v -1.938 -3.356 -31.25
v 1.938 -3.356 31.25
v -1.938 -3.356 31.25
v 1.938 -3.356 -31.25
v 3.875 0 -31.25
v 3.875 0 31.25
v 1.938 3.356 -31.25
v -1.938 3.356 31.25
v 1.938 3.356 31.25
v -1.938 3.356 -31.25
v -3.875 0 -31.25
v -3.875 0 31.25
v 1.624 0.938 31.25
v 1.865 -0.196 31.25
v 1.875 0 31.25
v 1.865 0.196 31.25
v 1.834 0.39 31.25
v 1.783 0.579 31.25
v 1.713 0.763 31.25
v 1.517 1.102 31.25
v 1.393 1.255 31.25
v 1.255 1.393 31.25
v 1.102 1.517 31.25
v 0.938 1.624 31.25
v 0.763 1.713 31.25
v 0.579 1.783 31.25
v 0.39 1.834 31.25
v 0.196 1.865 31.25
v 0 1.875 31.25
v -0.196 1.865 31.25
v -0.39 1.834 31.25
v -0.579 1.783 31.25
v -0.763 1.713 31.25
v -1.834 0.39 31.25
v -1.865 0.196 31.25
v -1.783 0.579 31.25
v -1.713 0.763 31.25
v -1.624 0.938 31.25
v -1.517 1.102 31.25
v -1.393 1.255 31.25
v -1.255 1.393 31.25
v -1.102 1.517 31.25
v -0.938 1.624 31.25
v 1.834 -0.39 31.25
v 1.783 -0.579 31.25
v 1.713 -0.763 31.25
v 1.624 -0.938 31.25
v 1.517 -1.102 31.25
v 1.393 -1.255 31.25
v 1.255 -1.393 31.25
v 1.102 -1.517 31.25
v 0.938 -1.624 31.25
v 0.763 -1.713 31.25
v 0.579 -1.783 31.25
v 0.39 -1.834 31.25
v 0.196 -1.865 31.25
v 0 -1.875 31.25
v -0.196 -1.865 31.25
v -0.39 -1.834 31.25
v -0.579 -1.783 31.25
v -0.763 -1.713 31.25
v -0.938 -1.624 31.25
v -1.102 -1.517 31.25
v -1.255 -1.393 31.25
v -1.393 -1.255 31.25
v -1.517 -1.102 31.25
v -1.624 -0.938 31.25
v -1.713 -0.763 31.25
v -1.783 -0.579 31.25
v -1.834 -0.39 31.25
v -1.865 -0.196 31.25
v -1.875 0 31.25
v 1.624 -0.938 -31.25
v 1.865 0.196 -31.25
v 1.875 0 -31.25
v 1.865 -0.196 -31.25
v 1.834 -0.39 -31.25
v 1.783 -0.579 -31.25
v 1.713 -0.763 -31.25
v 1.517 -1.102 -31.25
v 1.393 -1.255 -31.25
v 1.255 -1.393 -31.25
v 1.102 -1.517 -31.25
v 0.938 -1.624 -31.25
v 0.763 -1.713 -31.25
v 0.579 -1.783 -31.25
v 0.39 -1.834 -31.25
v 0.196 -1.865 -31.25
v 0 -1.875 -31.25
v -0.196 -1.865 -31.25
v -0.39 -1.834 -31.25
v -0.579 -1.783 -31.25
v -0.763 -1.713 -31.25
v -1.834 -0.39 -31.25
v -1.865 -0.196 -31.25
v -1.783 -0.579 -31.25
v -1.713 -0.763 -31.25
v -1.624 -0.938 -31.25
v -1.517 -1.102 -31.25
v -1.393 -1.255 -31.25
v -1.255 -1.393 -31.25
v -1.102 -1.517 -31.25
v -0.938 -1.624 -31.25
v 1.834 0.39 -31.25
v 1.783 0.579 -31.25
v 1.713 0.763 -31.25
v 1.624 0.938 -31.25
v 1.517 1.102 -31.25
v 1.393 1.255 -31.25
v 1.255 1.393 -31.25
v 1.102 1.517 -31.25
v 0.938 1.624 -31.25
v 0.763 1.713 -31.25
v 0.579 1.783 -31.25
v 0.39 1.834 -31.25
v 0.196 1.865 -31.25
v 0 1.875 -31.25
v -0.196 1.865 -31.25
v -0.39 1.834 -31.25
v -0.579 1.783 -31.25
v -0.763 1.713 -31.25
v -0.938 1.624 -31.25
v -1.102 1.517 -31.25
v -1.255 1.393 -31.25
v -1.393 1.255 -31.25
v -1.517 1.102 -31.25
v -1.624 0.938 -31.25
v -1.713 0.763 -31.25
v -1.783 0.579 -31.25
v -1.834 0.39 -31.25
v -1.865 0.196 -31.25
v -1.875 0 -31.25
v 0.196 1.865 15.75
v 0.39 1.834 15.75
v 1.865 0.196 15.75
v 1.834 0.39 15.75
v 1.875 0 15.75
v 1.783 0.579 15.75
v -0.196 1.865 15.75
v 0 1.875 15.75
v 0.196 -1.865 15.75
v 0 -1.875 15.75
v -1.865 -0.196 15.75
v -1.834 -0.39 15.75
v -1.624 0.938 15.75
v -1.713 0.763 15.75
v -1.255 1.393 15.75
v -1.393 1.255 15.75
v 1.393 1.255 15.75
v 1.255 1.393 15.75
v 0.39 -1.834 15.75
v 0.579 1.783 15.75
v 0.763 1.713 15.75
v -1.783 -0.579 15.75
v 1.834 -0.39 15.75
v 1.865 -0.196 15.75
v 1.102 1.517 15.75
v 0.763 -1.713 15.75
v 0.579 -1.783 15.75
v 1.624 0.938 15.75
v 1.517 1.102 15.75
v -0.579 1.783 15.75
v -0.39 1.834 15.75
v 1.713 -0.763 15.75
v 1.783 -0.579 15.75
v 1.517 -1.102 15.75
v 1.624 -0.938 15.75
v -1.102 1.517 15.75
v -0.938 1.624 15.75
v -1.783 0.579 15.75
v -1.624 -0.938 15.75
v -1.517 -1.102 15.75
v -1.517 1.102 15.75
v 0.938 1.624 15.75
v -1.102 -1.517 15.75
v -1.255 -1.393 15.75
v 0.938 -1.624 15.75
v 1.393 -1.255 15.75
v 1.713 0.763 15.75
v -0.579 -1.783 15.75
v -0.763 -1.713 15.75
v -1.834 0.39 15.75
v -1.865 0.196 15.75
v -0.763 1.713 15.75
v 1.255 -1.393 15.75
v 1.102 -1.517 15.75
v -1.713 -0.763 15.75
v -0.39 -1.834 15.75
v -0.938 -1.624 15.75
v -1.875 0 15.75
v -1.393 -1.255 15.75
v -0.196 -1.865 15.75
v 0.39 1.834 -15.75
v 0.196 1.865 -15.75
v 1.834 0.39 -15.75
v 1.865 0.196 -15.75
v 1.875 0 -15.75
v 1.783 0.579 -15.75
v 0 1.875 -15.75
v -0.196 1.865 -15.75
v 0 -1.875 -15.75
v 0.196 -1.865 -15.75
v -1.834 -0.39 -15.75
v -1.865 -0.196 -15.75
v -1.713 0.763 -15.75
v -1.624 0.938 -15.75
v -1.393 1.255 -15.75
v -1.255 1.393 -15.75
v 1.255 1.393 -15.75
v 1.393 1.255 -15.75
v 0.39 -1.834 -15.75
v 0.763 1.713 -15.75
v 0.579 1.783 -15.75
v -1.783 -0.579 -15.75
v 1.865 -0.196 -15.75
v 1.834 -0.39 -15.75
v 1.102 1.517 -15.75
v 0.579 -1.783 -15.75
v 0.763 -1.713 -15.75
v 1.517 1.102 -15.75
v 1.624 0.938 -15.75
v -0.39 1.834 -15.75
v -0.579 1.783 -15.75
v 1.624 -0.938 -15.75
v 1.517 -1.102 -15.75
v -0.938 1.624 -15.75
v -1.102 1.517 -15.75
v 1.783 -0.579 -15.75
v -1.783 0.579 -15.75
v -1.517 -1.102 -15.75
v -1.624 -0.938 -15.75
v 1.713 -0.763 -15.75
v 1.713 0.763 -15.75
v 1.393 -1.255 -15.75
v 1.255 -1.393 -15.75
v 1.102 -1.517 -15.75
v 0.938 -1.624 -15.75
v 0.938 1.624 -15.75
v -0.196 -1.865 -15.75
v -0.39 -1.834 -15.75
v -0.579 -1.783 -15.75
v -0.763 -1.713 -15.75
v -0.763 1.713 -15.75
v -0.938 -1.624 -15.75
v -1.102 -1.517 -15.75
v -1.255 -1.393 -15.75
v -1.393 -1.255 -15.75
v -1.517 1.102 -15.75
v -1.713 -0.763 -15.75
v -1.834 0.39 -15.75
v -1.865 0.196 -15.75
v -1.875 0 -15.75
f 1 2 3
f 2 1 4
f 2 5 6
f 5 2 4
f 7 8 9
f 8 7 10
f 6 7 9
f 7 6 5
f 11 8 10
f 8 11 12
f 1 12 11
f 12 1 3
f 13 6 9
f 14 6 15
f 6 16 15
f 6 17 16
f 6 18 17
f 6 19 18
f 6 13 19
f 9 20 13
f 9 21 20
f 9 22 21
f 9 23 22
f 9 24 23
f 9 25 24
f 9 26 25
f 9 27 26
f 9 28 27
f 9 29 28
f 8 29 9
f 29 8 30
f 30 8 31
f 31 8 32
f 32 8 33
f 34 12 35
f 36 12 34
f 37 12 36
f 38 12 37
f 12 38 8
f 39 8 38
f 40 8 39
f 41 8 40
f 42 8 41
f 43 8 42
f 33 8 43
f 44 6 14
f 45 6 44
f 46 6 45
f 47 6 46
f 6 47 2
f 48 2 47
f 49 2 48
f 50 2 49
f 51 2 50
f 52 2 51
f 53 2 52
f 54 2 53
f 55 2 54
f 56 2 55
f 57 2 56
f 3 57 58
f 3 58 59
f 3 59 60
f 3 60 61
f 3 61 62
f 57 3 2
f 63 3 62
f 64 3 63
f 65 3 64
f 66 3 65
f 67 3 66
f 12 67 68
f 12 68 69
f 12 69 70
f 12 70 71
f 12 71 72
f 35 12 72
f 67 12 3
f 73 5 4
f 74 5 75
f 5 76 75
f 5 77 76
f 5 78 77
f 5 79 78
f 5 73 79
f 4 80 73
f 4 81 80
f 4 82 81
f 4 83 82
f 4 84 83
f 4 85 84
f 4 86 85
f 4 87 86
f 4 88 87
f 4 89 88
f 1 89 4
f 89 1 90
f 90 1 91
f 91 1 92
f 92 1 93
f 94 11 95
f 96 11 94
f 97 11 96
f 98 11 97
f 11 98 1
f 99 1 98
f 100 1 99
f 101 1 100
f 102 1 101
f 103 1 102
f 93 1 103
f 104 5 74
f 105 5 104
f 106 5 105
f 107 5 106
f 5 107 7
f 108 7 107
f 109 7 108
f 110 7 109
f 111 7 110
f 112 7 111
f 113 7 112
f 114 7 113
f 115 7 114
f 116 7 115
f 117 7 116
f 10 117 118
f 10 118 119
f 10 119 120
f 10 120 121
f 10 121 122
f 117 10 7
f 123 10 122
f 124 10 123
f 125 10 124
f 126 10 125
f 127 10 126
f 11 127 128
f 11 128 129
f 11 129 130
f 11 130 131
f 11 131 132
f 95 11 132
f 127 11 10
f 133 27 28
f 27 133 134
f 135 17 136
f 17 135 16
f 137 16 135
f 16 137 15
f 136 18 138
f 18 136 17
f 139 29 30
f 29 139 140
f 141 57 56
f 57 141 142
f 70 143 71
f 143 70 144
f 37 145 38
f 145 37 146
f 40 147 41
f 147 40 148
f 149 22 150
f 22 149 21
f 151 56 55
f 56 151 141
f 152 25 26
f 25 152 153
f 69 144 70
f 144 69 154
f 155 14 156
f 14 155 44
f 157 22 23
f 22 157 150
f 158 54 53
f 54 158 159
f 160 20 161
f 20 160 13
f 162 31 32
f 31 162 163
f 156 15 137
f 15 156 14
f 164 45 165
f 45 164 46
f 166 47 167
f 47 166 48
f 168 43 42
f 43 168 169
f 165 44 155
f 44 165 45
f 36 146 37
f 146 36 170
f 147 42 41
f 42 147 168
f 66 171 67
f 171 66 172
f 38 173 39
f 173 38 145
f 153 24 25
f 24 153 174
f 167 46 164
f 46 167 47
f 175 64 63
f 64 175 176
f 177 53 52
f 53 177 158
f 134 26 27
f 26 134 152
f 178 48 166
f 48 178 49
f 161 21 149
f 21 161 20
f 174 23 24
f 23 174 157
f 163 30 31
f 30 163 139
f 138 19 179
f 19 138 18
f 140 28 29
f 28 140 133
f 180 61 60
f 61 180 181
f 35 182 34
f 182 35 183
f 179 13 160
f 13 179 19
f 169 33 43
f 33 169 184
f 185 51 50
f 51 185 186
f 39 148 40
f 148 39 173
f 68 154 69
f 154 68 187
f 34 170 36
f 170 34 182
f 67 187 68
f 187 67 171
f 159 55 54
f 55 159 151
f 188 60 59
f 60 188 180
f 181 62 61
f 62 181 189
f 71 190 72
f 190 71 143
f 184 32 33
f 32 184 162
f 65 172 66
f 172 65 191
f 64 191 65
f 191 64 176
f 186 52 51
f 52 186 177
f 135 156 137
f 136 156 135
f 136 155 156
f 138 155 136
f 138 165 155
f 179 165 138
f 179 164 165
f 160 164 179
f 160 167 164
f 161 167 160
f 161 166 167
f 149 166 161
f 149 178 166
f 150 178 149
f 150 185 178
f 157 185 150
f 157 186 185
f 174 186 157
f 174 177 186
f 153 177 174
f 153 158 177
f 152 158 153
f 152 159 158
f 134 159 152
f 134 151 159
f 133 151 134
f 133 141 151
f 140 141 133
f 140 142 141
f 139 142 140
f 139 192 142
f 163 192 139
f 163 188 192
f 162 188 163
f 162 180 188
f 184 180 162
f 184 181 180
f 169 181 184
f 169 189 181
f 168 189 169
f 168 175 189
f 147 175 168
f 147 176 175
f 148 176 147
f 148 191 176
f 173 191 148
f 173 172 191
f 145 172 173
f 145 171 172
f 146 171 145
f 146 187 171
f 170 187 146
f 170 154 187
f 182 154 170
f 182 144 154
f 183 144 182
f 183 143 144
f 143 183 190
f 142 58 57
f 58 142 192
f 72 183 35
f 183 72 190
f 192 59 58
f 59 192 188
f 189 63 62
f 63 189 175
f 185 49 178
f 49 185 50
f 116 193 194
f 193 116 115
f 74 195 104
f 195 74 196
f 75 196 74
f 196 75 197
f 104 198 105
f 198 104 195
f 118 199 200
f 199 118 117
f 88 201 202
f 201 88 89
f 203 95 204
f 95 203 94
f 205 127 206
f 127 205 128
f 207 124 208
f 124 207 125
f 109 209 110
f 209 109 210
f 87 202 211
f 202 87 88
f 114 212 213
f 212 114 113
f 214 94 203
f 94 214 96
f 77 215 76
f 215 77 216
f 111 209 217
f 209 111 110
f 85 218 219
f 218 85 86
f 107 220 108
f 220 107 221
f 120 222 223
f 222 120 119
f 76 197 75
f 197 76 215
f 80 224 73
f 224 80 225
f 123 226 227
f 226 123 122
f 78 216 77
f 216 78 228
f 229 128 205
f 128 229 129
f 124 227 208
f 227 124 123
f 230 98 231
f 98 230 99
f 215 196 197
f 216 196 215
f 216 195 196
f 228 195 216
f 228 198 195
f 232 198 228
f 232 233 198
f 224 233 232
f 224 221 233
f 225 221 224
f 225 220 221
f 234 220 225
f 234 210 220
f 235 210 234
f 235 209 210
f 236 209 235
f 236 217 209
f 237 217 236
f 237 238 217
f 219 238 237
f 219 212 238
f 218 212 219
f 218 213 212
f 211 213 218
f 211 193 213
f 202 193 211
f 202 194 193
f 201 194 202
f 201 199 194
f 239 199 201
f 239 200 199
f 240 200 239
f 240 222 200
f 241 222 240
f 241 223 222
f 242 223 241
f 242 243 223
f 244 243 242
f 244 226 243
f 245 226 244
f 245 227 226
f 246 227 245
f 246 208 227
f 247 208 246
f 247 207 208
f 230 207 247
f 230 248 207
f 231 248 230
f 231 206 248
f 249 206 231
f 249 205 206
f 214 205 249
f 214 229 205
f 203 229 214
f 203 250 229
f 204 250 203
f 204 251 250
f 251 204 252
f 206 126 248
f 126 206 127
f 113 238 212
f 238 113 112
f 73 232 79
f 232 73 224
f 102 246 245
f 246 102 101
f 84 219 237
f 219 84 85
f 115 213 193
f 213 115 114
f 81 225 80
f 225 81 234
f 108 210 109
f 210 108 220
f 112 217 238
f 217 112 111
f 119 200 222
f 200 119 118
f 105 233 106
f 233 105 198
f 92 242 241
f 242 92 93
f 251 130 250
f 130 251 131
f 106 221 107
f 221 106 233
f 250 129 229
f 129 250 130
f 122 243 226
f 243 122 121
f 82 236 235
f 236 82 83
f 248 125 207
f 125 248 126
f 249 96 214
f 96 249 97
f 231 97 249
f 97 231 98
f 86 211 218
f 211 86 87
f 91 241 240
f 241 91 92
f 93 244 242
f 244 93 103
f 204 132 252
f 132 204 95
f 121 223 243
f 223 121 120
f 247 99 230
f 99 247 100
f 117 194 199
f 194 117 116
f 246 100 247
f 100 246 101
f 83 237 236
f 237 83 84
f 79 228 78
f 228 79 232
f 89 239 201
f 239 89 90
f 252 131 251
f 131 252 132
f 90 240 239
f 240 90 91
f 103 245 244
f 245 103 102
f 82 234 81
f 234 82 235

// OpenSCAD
// file: dimensions.scad
$fn = 60;

// led strip

led_strip_width         = 12.0;  // mm
led_strip_height        =  4.0;  // mm

led_strip_clutch_length =  5.0;  // mm
led_strip_clutch_height =  1.5;  // mm

led_strip_end_length    = 22.0;  // mm
led_strip_end_width     = 14.0;  // mm
led_strip_end_height    =  6.5;  // mm

led_wire_diameter       =  1.8;  // mm
led_wire_length         = 90.0;   // mm
led_wire_sort_distance  = 15.0;   // mm

led_wire_clutch_width   =  9.0;  // mm
led_wire_clutch_length  = 15.0;  // mm
led_wire_clutch_height  = led_wire_diameter;  // mm

led_length_requirements = (
      led_strip_clutch_length  // led clutch area
    + led_strip_end_length     // led end cap
    + led_wire_sort_distance   // sorting the wires to a ribbon cable
    + led_wire_sort_distance   // clamping the wires down
    + led_wire_sort_distance   // bending the wires around
);

// cases

case_wall      =  2.0; // mm
case_plate     =  2.0; // mm
case_z_radius  =  1.0; // mm, horizontal edge radius


// screws - M3 machine screws, roughly measured

screw_shaft_diameter   = 3.0; // mm
screw_head_diameter    = 5.5; // mm
screw_head_height      = 3.0; // mm
screw_shaft_max_length = 20; // mm

screw_nut_diameter   = 6.0; // mm
screw_nut_height     = 2.2; // mm

screw_hole_slack     = 0.2 * 2; // mm


screw_pillar_diameter = screw_nut_diameter +  2 * case_wall;
screw_pillar_radius   = screw_pillar_diameter / 2;
screw_shaft_radius    = screw_shaft_diameter / 2;



// hook case

// the z height depends also on the screw length, check comment
hook_case_outer = [
    led_strip_end_width + 2 * screw_pillar_diameter,
    led_length_requirements + case_wall,            // only one, the second is used to clutch the led strip
    (
        10.0                                        // mm inner height needed for bending the cables
      + case_plate * 2                              // top and bottom plate
      +  1.0                                        // to get to (10 + 2*2 + 1) = 15 - screw_head_height = 12 mm screws
    )
];

hook_case_inner = hook_case_outer - 2 * [case_wall, case_wall, case_plate];
hook_case_pillar_center = hook_case_outer - [screw_pillar_diameter, screw_pillar_diameter, screw_pillar_diameter];


// the wire clutch for a case

wire_clutch_clamp_block_width  =  5.0; // mm
wire_clutch_clamp_slide_length =  5.0; // mm
wire_clutch_assembly_offset    = led_length_requirements - 2 * led_wire_sort_distance;


// usb-c connector cutout
usb_c_connector = [13.5, 9.0, 5.3]; // mmm


// qtpy

qtpy_clearance_usb   = 1.2;      // mm, the usb-c part sticks out of the plate
qtpy_clearance_upper = 3.5;      // mm, leave at least this much space above the plate
qtpy_clearance_lower = 1.5;      // mm, leave at least this much space below the plate


// measured from prusa spools

spool_inner_diameter      = 88.25;  // mm, measured
spool_inner_height        = 20.0;   // mm, measured
spool_inner_ring_height   =  5.0;   // mm, measured


// some assumptions from my side

spool_case_taper        =  0.75; // mm, amount of height added to have a slope for the spools to stick on
spool_case_corner       =  1;    // mm, corner radius of the case
spool_case_rim_height   =  2;    // mm, the hight of the rim of the cases fitting into each other
spool_case_rim_slack    =  0.1;  // mm, give the rim a little slack
spool_protection_bulge  =  60;    // mm, diameter for led protection bulge


// calculations

spool_inner_net_height  = spool_inner_height - spool_inner_ring_height;
spool_case_strip_height = led_strip_width + 10;  // give a little leeway
spool_case_height       = spool_case_strip_height + spool_inner_net_height * 2;

spool_case_cut        = led_strip_height / 2;

spool_case_diameter = spool_inner_diameter;
spool_case_radius = spool_inner_diameter / 2;


// helper vector to cut the spool case

spool_cutter = [spool_case_diameter + 2, spool_case_diameter + 2, spool_case_diameter + 2];




module rounded_edge(length=20, radius=5, slack=0.25) {
    offset_vector = [radius, radius, length] / 2;
    translate(-offset_vector)
        difference() {
            cube([radius + slack, radius + slack, length]);
            translate([0, 0, -1])
                cylinder(length + 2, r=radius);
        }
}


module copy_mirror(vector) {
    children();
    mirror(vector) children();
}
// main file
include<dimensions.scad>;

spool_distance = 62.5; // mm


m4_screw = 4; // mm
m4_screw_hole = 3.75; // mm
m4_screw_length = 15; // mm

wall = 2; // mm

pole_diameter = m4_screw_hole + 2 * wall;

difference() {
cylinder(h=spool_distance, d=pole_diameter, center=true, $fn=6);
translate([0, 0, (+spool_distance - m4_screw_length) / 2])
    cylinder(h=m4_screw_length + 1, d=m4_screw_hole, center=true);
translate([0, 0, (-spool_distance + m4_screw_length) / 2])
    cylinder(h=m4_screw_length + 1, d=m4_screw_hole, center=true);

}
